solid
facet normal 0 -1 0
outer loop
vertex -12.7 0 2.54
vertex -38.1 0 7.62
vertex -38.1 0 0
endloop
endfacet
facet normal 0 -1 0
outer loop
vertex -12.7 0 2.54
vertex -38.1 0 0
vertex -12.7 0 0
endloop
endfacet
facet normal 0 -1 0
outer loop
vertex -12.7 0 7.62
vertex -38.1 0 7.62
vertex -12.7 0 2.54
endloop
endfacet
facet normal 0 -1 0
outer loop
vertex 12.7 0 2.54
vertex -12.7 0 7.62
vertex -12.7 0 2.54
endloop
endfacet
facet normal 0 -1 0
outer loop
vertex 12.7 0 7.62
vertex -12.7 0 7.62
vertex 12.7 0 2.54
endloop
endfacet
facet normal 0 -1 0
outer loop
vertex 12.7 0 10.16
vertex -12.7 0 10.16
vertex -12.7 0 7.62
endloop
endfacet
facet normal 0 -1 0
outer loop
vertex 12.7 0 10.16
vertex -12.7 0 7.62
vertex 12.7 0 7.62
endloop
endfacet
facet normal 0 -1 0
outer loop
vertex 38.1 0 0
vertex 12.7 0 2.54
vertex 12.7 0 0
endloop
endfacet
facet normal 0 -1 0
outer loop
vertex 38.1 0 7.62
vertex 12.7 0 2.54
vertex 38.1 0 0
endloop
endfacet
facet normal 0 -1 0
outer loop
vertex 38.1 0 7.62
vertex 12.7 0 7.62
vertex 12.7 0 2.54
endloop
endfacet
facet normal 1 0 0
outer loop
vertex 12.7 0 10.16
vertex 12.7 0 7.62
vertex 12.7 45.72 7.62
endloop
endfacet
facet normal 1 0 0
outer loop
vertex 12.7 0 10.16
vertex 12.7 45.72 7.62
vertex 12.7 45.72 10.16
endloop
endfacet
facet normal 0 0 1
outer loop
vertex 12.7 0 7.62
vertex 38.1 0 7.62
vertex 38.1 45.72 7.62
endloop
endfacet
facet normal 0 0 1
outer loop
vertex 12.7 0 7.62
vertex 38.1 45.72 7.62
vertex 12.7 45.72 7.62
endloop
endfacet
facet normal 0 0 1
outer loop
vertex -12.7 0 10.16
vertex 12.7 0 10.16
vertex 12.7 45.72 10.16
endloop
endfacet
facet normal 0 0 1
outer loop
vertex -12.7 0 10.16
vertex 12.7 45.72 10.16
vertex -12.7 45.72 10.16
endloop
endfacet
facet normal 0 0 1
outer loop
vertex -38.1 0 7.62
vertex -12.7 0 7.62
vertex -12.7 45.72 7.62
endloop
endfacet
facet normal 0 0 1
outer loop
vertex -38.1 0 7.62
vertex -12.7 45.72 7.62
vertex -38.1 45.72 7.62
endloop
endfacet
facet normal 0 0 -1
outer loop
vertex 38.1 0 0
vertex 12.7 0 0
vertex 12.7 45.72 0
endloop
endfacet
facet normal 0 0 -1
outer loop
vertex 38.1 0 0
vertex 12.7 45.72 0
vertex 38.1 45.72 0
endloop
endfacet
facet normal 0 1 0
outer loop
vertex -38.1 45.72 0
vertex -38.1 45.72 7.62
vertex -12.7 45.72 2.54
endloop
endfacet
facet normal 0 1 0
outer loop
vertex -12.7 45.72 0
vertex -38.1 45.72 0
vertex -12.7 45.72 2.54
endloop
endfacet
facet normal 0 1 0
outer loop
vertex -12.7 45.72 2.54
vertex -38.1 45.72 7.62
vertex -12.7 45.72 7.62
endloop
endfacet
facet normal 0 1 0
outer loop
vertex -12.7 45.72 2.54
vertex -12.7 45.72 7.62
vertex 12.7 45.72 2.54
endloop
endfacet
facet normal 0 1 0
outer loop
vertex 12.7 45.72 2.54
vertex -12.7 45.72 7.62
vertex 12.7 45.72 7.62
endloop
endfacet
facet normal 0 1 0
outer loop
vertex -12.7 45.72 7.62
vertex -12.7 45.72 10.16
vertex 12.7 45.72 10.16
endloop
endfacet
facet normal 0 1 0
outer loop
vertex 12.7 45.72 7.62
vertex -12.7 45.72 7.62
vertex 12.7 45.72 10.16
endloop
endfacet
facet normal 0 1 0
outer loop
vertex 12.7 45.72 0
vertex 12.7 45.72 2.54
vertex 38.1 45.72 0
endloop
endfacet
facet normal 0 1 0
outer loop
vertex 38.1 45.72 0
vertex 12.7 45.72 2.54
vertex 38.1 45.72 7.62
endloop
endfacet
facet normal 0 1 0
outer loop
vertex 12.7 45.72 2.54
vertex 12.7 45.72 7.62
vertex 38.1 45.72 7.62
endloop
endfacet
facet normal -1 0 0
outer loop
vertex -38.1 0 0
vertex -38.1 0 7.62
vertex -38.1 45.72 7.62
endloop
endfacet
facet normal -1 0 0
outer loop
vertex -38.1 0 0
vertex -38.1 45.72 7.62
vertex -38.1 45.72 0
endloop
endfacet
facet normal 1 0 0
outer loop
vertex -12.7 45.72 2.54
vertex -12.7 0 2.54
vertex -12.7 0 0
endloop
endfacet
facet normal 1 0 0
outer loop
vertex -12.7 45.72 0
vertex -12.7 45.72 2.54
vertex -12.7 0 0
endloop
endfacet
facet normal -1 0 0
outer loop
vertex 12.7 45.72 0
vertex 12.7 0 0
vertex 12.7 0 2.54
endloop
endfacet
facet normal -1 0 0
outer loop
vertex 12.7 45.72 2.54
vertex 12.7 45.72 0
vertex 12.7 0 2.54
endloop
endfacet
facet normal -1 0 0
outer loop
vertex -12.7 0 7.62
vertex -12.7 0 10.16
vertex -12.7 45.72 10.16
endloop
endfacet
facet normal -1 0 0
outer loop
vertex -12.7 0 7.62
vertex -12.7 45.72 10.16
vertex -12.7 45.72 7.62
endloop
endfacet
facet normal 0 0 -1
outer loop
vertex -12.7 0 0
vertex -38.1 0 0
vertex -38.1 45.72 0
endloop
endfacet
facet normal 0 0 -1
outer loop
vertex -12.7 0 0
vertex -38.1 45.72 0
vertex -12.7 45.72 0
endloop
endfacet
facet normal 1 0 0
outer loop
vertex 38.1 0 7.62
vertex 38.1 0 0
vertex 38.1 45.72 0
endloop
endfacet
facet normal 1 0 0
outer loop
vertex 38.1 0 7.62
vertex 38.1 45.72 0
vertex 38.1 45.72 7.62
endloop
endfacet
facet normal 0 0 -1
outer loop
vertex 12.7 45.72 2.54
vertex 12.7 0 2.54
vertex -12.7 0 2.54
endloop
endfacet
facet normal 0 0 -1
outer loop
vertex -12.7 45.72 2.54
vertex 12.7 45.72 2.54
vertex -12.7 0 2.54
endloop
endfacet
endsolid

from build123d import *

# Parameters (mm, degrees)
F1_DEPTH = 45.72
F4_DEPTH = 45.721
F7_DEPTH = 45.72


with BuildPart() as f1:
    # F0 (on Front) → F1 (new body)
    with BuildSketch(Plane.XZ):
        Polygon((-38.1, 0), (0, 0), (38.1, 0), (38.1, 7.62), (-38.1, 7.62), align=None)
    extrude(amount=-F1_DEPTH)

    # F3 (on offset) → F4 (cut, through all)
    with BuildSketch(Plane.XZ):
        Polygon((-12.7, 0), (0, 0), (12.7, 0), (12.7, 2.54), (-12.7, 2.54), align=None)
    extrude(amount=-F4_DEPTH, mode=Mode.SUBTRACT)

    # F6 (on offset) → F7 (join)
    with BuildSketch(Plane.XZ):
        Polygon((-12.7, 7.62), (0, 7.62), (12.7, 7.62), (12.7, 10.16), (-12.7, 10.16), align=None)
    extrude(amount=-F7_DEPTH)


solid = f1.part
